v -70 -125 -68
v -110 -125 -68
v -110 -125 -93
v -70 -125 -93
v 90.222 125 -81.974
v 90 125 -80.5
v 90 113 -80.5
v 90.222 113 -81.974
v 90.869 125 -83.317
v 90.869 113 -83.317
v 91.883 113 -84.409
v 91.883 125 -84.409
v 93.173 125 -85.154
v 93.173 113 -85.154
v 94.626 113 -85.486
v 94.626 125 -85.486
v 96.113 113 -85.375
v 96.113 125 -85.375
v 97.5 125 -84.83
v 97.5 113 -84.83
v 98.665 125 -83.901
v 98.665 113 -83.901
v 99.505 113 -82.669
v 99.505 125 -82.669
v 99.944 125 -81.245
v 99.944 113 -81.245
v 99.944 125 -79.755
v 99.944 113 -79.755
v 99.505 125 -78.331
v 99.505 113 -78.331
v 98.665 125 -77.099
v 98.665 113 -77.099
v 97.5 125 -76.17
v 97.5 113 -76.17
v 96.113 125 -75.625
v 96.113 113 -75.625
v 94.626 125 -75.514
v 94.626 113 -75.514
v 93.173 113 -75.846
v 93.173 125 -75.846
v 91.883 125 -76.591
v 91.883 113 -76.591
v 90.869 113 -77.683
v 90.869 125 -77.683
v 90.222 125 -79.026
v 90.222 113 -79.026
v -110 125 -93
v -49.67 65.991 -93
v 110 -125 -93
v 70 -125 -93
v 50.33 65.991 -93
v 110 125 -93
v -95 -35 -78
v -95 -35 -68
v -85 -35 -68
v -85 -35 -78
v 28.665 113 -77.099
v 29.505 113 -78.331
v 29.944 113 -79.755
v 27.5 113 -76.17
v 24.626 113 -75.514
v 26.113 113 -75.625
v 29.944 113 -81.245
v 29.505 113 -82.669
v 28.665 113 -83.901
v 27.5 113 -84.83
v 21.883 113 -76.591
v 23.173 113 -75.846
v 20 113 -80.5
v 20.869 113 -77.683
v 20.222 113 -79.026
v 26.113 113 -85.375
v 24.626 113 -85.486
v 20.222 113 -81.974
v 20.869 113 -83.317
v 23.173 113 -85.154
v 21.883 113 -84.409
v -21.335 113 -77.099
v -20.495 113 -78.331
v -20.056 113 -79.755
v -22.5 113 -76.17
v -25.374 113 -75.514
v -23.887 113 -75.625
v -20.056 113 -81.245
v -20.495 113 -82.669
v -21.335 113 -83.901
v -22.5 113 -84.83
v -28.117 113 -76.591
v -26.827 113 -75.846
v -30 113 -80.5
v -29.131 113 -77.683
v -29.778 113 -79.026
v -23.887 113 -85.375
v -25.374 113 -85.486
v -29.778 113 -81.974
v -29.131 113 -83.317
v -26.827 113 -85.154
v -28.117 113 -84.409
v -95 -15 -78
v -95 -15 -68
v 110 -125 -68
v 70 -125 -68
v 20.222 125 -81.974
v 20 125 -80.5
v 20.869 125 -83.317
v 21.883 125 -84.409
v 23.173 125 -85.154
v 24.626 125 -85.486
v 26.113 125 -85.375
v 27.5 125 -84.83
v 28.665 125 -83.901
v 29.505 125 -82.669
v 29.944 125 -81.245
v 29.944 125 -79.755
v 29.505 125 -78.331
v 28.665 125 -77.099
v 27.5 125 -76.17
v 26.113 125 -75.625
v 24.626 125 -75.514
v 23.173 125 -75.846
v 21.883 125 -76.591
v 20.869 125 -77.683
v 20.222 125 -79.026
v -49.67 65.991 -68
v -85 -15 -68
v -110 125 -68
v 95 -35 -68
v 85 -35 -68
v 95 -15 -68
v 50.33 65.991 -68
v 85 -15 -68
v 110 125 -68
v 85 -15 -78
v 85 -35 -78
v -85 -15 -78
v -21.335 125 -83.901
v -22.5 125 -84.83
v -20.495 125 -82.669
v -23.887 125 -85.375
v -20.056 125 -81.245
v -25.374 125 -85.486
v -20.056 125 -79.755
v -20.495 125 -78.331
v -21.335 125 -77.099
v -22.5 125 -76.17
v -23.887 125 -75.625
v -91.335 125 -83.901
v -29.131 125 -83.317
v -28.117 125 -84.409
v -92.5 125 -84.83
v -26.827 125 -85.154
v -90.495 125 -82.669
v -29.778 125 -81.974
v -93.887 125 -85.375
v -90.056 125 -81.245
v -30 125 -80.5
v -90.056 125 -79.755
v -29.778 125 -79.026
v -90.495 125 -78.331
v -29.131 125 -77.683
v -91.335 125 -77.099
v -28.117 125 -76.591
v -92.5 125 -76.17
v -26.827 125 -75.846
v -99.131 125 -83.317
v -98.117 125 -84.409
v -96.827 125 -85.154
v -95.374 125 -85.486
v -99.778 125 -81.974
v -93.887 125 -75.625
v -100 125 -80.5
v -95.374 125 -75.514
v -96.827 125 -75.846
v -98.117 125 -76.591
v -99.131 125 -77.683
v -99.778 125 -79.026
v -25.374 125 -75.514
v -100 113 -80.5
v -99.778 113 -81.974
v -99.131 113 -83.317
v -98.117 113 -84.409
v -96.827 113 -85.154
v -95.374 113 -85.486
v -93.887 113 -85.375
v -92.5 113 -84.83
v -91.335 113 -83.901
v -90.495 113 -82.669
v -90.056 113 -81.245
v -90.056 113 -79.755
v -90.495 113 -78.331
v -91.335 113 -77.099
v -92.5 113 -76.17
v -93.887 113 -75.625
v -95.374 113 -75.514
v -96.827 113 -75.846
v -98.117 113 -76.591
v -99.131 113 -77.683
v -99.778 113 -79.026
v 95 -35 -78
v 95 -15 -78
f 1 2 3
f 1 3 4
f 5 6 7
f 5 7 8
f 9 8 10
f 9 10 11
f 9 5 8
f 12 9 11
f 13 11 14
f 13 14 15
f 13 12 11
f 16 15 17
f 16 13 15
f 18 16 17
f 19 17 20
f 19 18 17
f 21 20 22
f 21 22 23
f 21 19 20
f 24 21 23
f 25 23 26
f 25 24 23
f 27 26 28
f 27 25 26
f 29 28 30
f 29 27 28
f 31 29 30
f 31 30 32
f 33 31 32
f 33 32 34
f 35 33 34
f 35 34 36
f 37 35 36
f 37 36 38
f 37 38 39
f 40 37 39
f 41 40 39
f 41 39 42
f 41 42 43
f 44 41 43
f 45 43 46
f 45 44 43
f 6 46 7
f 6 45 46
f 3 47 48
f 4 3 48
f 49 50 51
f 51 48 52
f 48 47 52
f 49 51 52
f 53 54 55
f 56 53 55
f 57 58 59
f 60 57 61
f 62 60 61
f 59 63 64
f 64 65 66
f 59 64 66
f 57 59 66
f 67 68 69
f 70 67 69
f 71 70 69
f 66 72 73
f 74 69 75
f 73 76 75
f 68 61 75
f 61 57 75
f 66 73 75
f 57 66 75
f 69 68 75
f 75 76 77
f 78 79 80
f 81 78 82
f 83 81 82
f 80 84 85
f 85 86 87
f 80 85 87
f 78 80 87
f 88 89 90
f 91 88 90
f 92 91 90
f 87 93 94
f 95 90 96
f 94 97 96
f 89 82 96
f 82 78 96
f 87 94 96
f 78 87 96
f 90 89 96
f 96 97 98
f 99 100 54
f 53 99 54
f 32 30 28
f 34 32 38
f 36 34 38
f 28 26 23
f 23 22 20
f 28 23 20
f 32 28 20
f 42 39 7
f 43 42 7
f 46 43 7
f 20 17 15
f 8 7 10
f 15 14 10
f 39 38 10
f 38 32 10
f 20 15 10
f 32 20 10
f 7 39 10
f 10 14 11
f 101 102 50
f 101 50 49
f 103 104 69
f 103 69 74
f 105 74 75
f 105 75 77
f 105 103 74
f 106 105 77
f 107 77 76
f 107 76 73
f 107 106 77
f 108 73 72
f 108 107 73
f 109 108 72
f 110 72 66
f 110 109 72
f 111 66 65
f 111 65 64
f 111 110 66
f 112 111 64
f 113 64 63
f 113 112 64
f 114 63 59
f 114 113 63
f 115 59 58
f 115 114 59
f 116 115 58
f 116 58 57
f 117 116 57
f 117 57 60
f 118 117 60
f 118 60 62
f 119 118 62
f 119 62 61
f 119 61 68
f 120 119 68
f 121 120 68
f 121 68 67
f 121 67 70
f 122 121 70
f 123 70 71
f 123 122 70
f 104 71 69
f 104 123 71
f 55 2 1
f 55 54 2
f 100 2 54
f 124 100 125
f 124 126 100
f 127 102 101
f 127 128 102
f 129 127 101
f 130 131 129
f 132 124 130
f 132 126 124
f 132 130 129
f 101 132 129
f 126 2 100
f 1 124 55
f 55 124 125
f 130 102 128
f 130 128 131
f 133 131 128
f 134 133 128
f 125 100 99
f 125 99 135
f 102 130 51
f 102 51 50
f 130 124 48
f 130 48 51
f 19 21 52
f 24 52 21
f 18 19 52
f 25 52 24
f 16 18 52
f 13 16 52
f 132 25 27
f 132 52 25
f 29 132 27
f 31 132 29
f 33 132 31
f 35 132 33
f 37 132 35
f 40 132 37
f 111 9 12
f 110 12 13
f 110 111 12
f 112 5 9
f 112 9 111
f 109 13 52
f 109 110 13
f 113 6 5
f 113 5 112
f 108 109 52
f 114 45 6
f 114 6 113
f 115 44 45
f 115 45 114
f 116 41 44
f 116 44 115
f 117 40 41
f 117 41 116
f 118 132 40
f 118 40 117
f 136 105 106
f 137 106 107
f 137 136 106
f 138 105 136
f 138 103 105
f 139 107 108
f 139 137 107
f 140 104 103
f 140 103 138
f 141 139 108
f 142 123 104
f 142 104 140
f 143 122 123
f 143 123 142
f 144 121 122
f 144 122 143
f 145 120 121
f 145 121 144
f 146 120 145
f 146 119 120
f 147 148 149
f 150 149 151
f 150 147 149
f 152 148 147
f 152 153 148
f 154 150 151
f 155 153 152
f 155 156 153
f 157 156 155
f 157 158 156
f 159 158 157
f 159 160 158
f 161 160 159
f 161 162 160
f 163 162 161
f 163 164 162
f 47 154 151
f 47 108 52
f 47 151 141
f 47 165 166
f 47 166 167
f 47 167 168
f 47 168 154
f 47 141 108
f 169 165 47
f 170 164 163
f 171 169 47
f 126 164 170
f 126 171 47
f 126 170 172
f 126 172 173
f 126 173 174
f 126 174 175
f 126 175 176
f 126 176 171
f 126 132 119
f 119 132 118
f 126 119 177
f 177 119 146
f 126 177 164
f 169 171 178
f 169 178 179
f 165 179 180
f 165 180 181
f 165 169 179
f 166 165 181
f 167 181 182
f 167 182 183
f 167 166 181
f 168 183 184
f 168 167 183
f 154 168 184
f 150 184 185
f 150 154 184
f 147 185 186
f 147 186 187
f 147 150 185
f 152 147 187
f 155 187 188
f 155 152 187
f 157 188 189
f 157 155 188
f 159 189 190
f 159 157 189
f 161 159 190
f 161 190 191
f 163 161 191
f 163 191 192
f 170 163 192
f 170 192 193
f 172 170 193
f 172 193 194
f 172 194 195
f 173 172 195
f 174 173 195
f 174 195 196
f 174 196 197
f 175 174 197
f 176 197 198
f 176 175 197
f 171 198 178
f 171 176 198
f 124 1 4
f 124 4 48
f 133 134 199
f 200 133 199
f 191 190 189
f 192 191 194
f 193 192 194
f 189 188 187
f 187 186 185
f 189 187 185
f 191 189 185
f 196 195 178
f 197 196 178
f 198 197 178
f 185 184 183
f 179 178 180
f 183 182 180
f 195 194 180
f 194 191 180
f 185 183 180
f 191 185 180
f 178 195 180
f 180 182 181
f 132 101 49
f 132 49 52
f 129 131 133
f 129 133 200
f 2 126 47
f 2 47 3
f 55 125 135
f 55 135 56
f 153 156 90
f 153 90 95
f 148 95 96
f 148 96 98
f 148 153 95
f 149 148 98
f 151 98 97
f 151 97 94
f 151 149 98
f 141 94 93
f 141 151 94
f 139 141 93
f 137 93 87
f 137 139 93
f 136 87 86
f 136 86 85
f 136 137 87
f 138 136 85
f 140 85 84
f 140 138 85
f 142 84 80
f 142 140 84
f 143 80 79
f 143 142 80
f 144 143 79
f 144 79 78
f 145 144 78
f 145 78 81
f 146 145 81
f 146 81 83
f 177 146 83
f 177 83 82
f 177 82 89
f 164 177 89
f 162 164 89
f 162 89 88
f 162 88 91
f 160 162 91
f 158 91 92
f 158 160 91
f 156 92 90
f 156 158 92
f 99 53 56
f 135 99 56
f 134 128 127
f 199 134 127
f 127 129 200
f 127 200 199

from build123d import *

# Parameters (mm, degrees)
F1_DEPTH = 25
F2_R     = 5
F3_DEPTH = 12
F4_W     = 10
F4_H     = 20
F5_DEPTH = 10


with BuildPart() as f1:
    # F0 (on Top) → F1 (new body)
    with BuildSketch(Plane.XY):
        Polygon((110, -125), (110, 125), (-110, 125), (-110, -125), (-70, -125), (-49.67048, 65.990649), (50.32952, 65.990649), (70, -125), align=None)
    extrude(amount=F1_DEPTH)

    # F2 (on face) → F3 (cut)
    with BuildSketch(Plane(origin=(0, 125, 0), x_dir=(-1, 0, 0), z_dir=(0, 1, 0))):
        with Locations((95, 12.5)):
            Circle(F2_R)
        with Locations((25, 12.5)):
            Circle(F2_R)
        with Locations((-25, 12.5)):
            Circle(F2_R)
        with Locations((-95, 12.5)):
            Circle(F2_R)
    extrude(amount=-F3_DEPTH, mode=Mode.SUBTRACT)

    # F4 (on face) → F5 (cut)
    with BuildSketch(Plane(origin=(0, 0, 0), x_dir=(1, 0, 0), z_dir=(0, 0, -1))):
        with Locations((-90, 25)):
            Rectangle(F4_W, F4_H)
        with Locations((90, 25)):
            Rectangle(F4_W, F4_H)
    extrude(amount=-F5_DEPTH, mode=Mode.SUBTRACT)


with BuildPart() as f7_1:
    # F7: instance of F1
    add(f1.part.mirror(Plane.XY.offset(-34)))


solid = f7_1.part
